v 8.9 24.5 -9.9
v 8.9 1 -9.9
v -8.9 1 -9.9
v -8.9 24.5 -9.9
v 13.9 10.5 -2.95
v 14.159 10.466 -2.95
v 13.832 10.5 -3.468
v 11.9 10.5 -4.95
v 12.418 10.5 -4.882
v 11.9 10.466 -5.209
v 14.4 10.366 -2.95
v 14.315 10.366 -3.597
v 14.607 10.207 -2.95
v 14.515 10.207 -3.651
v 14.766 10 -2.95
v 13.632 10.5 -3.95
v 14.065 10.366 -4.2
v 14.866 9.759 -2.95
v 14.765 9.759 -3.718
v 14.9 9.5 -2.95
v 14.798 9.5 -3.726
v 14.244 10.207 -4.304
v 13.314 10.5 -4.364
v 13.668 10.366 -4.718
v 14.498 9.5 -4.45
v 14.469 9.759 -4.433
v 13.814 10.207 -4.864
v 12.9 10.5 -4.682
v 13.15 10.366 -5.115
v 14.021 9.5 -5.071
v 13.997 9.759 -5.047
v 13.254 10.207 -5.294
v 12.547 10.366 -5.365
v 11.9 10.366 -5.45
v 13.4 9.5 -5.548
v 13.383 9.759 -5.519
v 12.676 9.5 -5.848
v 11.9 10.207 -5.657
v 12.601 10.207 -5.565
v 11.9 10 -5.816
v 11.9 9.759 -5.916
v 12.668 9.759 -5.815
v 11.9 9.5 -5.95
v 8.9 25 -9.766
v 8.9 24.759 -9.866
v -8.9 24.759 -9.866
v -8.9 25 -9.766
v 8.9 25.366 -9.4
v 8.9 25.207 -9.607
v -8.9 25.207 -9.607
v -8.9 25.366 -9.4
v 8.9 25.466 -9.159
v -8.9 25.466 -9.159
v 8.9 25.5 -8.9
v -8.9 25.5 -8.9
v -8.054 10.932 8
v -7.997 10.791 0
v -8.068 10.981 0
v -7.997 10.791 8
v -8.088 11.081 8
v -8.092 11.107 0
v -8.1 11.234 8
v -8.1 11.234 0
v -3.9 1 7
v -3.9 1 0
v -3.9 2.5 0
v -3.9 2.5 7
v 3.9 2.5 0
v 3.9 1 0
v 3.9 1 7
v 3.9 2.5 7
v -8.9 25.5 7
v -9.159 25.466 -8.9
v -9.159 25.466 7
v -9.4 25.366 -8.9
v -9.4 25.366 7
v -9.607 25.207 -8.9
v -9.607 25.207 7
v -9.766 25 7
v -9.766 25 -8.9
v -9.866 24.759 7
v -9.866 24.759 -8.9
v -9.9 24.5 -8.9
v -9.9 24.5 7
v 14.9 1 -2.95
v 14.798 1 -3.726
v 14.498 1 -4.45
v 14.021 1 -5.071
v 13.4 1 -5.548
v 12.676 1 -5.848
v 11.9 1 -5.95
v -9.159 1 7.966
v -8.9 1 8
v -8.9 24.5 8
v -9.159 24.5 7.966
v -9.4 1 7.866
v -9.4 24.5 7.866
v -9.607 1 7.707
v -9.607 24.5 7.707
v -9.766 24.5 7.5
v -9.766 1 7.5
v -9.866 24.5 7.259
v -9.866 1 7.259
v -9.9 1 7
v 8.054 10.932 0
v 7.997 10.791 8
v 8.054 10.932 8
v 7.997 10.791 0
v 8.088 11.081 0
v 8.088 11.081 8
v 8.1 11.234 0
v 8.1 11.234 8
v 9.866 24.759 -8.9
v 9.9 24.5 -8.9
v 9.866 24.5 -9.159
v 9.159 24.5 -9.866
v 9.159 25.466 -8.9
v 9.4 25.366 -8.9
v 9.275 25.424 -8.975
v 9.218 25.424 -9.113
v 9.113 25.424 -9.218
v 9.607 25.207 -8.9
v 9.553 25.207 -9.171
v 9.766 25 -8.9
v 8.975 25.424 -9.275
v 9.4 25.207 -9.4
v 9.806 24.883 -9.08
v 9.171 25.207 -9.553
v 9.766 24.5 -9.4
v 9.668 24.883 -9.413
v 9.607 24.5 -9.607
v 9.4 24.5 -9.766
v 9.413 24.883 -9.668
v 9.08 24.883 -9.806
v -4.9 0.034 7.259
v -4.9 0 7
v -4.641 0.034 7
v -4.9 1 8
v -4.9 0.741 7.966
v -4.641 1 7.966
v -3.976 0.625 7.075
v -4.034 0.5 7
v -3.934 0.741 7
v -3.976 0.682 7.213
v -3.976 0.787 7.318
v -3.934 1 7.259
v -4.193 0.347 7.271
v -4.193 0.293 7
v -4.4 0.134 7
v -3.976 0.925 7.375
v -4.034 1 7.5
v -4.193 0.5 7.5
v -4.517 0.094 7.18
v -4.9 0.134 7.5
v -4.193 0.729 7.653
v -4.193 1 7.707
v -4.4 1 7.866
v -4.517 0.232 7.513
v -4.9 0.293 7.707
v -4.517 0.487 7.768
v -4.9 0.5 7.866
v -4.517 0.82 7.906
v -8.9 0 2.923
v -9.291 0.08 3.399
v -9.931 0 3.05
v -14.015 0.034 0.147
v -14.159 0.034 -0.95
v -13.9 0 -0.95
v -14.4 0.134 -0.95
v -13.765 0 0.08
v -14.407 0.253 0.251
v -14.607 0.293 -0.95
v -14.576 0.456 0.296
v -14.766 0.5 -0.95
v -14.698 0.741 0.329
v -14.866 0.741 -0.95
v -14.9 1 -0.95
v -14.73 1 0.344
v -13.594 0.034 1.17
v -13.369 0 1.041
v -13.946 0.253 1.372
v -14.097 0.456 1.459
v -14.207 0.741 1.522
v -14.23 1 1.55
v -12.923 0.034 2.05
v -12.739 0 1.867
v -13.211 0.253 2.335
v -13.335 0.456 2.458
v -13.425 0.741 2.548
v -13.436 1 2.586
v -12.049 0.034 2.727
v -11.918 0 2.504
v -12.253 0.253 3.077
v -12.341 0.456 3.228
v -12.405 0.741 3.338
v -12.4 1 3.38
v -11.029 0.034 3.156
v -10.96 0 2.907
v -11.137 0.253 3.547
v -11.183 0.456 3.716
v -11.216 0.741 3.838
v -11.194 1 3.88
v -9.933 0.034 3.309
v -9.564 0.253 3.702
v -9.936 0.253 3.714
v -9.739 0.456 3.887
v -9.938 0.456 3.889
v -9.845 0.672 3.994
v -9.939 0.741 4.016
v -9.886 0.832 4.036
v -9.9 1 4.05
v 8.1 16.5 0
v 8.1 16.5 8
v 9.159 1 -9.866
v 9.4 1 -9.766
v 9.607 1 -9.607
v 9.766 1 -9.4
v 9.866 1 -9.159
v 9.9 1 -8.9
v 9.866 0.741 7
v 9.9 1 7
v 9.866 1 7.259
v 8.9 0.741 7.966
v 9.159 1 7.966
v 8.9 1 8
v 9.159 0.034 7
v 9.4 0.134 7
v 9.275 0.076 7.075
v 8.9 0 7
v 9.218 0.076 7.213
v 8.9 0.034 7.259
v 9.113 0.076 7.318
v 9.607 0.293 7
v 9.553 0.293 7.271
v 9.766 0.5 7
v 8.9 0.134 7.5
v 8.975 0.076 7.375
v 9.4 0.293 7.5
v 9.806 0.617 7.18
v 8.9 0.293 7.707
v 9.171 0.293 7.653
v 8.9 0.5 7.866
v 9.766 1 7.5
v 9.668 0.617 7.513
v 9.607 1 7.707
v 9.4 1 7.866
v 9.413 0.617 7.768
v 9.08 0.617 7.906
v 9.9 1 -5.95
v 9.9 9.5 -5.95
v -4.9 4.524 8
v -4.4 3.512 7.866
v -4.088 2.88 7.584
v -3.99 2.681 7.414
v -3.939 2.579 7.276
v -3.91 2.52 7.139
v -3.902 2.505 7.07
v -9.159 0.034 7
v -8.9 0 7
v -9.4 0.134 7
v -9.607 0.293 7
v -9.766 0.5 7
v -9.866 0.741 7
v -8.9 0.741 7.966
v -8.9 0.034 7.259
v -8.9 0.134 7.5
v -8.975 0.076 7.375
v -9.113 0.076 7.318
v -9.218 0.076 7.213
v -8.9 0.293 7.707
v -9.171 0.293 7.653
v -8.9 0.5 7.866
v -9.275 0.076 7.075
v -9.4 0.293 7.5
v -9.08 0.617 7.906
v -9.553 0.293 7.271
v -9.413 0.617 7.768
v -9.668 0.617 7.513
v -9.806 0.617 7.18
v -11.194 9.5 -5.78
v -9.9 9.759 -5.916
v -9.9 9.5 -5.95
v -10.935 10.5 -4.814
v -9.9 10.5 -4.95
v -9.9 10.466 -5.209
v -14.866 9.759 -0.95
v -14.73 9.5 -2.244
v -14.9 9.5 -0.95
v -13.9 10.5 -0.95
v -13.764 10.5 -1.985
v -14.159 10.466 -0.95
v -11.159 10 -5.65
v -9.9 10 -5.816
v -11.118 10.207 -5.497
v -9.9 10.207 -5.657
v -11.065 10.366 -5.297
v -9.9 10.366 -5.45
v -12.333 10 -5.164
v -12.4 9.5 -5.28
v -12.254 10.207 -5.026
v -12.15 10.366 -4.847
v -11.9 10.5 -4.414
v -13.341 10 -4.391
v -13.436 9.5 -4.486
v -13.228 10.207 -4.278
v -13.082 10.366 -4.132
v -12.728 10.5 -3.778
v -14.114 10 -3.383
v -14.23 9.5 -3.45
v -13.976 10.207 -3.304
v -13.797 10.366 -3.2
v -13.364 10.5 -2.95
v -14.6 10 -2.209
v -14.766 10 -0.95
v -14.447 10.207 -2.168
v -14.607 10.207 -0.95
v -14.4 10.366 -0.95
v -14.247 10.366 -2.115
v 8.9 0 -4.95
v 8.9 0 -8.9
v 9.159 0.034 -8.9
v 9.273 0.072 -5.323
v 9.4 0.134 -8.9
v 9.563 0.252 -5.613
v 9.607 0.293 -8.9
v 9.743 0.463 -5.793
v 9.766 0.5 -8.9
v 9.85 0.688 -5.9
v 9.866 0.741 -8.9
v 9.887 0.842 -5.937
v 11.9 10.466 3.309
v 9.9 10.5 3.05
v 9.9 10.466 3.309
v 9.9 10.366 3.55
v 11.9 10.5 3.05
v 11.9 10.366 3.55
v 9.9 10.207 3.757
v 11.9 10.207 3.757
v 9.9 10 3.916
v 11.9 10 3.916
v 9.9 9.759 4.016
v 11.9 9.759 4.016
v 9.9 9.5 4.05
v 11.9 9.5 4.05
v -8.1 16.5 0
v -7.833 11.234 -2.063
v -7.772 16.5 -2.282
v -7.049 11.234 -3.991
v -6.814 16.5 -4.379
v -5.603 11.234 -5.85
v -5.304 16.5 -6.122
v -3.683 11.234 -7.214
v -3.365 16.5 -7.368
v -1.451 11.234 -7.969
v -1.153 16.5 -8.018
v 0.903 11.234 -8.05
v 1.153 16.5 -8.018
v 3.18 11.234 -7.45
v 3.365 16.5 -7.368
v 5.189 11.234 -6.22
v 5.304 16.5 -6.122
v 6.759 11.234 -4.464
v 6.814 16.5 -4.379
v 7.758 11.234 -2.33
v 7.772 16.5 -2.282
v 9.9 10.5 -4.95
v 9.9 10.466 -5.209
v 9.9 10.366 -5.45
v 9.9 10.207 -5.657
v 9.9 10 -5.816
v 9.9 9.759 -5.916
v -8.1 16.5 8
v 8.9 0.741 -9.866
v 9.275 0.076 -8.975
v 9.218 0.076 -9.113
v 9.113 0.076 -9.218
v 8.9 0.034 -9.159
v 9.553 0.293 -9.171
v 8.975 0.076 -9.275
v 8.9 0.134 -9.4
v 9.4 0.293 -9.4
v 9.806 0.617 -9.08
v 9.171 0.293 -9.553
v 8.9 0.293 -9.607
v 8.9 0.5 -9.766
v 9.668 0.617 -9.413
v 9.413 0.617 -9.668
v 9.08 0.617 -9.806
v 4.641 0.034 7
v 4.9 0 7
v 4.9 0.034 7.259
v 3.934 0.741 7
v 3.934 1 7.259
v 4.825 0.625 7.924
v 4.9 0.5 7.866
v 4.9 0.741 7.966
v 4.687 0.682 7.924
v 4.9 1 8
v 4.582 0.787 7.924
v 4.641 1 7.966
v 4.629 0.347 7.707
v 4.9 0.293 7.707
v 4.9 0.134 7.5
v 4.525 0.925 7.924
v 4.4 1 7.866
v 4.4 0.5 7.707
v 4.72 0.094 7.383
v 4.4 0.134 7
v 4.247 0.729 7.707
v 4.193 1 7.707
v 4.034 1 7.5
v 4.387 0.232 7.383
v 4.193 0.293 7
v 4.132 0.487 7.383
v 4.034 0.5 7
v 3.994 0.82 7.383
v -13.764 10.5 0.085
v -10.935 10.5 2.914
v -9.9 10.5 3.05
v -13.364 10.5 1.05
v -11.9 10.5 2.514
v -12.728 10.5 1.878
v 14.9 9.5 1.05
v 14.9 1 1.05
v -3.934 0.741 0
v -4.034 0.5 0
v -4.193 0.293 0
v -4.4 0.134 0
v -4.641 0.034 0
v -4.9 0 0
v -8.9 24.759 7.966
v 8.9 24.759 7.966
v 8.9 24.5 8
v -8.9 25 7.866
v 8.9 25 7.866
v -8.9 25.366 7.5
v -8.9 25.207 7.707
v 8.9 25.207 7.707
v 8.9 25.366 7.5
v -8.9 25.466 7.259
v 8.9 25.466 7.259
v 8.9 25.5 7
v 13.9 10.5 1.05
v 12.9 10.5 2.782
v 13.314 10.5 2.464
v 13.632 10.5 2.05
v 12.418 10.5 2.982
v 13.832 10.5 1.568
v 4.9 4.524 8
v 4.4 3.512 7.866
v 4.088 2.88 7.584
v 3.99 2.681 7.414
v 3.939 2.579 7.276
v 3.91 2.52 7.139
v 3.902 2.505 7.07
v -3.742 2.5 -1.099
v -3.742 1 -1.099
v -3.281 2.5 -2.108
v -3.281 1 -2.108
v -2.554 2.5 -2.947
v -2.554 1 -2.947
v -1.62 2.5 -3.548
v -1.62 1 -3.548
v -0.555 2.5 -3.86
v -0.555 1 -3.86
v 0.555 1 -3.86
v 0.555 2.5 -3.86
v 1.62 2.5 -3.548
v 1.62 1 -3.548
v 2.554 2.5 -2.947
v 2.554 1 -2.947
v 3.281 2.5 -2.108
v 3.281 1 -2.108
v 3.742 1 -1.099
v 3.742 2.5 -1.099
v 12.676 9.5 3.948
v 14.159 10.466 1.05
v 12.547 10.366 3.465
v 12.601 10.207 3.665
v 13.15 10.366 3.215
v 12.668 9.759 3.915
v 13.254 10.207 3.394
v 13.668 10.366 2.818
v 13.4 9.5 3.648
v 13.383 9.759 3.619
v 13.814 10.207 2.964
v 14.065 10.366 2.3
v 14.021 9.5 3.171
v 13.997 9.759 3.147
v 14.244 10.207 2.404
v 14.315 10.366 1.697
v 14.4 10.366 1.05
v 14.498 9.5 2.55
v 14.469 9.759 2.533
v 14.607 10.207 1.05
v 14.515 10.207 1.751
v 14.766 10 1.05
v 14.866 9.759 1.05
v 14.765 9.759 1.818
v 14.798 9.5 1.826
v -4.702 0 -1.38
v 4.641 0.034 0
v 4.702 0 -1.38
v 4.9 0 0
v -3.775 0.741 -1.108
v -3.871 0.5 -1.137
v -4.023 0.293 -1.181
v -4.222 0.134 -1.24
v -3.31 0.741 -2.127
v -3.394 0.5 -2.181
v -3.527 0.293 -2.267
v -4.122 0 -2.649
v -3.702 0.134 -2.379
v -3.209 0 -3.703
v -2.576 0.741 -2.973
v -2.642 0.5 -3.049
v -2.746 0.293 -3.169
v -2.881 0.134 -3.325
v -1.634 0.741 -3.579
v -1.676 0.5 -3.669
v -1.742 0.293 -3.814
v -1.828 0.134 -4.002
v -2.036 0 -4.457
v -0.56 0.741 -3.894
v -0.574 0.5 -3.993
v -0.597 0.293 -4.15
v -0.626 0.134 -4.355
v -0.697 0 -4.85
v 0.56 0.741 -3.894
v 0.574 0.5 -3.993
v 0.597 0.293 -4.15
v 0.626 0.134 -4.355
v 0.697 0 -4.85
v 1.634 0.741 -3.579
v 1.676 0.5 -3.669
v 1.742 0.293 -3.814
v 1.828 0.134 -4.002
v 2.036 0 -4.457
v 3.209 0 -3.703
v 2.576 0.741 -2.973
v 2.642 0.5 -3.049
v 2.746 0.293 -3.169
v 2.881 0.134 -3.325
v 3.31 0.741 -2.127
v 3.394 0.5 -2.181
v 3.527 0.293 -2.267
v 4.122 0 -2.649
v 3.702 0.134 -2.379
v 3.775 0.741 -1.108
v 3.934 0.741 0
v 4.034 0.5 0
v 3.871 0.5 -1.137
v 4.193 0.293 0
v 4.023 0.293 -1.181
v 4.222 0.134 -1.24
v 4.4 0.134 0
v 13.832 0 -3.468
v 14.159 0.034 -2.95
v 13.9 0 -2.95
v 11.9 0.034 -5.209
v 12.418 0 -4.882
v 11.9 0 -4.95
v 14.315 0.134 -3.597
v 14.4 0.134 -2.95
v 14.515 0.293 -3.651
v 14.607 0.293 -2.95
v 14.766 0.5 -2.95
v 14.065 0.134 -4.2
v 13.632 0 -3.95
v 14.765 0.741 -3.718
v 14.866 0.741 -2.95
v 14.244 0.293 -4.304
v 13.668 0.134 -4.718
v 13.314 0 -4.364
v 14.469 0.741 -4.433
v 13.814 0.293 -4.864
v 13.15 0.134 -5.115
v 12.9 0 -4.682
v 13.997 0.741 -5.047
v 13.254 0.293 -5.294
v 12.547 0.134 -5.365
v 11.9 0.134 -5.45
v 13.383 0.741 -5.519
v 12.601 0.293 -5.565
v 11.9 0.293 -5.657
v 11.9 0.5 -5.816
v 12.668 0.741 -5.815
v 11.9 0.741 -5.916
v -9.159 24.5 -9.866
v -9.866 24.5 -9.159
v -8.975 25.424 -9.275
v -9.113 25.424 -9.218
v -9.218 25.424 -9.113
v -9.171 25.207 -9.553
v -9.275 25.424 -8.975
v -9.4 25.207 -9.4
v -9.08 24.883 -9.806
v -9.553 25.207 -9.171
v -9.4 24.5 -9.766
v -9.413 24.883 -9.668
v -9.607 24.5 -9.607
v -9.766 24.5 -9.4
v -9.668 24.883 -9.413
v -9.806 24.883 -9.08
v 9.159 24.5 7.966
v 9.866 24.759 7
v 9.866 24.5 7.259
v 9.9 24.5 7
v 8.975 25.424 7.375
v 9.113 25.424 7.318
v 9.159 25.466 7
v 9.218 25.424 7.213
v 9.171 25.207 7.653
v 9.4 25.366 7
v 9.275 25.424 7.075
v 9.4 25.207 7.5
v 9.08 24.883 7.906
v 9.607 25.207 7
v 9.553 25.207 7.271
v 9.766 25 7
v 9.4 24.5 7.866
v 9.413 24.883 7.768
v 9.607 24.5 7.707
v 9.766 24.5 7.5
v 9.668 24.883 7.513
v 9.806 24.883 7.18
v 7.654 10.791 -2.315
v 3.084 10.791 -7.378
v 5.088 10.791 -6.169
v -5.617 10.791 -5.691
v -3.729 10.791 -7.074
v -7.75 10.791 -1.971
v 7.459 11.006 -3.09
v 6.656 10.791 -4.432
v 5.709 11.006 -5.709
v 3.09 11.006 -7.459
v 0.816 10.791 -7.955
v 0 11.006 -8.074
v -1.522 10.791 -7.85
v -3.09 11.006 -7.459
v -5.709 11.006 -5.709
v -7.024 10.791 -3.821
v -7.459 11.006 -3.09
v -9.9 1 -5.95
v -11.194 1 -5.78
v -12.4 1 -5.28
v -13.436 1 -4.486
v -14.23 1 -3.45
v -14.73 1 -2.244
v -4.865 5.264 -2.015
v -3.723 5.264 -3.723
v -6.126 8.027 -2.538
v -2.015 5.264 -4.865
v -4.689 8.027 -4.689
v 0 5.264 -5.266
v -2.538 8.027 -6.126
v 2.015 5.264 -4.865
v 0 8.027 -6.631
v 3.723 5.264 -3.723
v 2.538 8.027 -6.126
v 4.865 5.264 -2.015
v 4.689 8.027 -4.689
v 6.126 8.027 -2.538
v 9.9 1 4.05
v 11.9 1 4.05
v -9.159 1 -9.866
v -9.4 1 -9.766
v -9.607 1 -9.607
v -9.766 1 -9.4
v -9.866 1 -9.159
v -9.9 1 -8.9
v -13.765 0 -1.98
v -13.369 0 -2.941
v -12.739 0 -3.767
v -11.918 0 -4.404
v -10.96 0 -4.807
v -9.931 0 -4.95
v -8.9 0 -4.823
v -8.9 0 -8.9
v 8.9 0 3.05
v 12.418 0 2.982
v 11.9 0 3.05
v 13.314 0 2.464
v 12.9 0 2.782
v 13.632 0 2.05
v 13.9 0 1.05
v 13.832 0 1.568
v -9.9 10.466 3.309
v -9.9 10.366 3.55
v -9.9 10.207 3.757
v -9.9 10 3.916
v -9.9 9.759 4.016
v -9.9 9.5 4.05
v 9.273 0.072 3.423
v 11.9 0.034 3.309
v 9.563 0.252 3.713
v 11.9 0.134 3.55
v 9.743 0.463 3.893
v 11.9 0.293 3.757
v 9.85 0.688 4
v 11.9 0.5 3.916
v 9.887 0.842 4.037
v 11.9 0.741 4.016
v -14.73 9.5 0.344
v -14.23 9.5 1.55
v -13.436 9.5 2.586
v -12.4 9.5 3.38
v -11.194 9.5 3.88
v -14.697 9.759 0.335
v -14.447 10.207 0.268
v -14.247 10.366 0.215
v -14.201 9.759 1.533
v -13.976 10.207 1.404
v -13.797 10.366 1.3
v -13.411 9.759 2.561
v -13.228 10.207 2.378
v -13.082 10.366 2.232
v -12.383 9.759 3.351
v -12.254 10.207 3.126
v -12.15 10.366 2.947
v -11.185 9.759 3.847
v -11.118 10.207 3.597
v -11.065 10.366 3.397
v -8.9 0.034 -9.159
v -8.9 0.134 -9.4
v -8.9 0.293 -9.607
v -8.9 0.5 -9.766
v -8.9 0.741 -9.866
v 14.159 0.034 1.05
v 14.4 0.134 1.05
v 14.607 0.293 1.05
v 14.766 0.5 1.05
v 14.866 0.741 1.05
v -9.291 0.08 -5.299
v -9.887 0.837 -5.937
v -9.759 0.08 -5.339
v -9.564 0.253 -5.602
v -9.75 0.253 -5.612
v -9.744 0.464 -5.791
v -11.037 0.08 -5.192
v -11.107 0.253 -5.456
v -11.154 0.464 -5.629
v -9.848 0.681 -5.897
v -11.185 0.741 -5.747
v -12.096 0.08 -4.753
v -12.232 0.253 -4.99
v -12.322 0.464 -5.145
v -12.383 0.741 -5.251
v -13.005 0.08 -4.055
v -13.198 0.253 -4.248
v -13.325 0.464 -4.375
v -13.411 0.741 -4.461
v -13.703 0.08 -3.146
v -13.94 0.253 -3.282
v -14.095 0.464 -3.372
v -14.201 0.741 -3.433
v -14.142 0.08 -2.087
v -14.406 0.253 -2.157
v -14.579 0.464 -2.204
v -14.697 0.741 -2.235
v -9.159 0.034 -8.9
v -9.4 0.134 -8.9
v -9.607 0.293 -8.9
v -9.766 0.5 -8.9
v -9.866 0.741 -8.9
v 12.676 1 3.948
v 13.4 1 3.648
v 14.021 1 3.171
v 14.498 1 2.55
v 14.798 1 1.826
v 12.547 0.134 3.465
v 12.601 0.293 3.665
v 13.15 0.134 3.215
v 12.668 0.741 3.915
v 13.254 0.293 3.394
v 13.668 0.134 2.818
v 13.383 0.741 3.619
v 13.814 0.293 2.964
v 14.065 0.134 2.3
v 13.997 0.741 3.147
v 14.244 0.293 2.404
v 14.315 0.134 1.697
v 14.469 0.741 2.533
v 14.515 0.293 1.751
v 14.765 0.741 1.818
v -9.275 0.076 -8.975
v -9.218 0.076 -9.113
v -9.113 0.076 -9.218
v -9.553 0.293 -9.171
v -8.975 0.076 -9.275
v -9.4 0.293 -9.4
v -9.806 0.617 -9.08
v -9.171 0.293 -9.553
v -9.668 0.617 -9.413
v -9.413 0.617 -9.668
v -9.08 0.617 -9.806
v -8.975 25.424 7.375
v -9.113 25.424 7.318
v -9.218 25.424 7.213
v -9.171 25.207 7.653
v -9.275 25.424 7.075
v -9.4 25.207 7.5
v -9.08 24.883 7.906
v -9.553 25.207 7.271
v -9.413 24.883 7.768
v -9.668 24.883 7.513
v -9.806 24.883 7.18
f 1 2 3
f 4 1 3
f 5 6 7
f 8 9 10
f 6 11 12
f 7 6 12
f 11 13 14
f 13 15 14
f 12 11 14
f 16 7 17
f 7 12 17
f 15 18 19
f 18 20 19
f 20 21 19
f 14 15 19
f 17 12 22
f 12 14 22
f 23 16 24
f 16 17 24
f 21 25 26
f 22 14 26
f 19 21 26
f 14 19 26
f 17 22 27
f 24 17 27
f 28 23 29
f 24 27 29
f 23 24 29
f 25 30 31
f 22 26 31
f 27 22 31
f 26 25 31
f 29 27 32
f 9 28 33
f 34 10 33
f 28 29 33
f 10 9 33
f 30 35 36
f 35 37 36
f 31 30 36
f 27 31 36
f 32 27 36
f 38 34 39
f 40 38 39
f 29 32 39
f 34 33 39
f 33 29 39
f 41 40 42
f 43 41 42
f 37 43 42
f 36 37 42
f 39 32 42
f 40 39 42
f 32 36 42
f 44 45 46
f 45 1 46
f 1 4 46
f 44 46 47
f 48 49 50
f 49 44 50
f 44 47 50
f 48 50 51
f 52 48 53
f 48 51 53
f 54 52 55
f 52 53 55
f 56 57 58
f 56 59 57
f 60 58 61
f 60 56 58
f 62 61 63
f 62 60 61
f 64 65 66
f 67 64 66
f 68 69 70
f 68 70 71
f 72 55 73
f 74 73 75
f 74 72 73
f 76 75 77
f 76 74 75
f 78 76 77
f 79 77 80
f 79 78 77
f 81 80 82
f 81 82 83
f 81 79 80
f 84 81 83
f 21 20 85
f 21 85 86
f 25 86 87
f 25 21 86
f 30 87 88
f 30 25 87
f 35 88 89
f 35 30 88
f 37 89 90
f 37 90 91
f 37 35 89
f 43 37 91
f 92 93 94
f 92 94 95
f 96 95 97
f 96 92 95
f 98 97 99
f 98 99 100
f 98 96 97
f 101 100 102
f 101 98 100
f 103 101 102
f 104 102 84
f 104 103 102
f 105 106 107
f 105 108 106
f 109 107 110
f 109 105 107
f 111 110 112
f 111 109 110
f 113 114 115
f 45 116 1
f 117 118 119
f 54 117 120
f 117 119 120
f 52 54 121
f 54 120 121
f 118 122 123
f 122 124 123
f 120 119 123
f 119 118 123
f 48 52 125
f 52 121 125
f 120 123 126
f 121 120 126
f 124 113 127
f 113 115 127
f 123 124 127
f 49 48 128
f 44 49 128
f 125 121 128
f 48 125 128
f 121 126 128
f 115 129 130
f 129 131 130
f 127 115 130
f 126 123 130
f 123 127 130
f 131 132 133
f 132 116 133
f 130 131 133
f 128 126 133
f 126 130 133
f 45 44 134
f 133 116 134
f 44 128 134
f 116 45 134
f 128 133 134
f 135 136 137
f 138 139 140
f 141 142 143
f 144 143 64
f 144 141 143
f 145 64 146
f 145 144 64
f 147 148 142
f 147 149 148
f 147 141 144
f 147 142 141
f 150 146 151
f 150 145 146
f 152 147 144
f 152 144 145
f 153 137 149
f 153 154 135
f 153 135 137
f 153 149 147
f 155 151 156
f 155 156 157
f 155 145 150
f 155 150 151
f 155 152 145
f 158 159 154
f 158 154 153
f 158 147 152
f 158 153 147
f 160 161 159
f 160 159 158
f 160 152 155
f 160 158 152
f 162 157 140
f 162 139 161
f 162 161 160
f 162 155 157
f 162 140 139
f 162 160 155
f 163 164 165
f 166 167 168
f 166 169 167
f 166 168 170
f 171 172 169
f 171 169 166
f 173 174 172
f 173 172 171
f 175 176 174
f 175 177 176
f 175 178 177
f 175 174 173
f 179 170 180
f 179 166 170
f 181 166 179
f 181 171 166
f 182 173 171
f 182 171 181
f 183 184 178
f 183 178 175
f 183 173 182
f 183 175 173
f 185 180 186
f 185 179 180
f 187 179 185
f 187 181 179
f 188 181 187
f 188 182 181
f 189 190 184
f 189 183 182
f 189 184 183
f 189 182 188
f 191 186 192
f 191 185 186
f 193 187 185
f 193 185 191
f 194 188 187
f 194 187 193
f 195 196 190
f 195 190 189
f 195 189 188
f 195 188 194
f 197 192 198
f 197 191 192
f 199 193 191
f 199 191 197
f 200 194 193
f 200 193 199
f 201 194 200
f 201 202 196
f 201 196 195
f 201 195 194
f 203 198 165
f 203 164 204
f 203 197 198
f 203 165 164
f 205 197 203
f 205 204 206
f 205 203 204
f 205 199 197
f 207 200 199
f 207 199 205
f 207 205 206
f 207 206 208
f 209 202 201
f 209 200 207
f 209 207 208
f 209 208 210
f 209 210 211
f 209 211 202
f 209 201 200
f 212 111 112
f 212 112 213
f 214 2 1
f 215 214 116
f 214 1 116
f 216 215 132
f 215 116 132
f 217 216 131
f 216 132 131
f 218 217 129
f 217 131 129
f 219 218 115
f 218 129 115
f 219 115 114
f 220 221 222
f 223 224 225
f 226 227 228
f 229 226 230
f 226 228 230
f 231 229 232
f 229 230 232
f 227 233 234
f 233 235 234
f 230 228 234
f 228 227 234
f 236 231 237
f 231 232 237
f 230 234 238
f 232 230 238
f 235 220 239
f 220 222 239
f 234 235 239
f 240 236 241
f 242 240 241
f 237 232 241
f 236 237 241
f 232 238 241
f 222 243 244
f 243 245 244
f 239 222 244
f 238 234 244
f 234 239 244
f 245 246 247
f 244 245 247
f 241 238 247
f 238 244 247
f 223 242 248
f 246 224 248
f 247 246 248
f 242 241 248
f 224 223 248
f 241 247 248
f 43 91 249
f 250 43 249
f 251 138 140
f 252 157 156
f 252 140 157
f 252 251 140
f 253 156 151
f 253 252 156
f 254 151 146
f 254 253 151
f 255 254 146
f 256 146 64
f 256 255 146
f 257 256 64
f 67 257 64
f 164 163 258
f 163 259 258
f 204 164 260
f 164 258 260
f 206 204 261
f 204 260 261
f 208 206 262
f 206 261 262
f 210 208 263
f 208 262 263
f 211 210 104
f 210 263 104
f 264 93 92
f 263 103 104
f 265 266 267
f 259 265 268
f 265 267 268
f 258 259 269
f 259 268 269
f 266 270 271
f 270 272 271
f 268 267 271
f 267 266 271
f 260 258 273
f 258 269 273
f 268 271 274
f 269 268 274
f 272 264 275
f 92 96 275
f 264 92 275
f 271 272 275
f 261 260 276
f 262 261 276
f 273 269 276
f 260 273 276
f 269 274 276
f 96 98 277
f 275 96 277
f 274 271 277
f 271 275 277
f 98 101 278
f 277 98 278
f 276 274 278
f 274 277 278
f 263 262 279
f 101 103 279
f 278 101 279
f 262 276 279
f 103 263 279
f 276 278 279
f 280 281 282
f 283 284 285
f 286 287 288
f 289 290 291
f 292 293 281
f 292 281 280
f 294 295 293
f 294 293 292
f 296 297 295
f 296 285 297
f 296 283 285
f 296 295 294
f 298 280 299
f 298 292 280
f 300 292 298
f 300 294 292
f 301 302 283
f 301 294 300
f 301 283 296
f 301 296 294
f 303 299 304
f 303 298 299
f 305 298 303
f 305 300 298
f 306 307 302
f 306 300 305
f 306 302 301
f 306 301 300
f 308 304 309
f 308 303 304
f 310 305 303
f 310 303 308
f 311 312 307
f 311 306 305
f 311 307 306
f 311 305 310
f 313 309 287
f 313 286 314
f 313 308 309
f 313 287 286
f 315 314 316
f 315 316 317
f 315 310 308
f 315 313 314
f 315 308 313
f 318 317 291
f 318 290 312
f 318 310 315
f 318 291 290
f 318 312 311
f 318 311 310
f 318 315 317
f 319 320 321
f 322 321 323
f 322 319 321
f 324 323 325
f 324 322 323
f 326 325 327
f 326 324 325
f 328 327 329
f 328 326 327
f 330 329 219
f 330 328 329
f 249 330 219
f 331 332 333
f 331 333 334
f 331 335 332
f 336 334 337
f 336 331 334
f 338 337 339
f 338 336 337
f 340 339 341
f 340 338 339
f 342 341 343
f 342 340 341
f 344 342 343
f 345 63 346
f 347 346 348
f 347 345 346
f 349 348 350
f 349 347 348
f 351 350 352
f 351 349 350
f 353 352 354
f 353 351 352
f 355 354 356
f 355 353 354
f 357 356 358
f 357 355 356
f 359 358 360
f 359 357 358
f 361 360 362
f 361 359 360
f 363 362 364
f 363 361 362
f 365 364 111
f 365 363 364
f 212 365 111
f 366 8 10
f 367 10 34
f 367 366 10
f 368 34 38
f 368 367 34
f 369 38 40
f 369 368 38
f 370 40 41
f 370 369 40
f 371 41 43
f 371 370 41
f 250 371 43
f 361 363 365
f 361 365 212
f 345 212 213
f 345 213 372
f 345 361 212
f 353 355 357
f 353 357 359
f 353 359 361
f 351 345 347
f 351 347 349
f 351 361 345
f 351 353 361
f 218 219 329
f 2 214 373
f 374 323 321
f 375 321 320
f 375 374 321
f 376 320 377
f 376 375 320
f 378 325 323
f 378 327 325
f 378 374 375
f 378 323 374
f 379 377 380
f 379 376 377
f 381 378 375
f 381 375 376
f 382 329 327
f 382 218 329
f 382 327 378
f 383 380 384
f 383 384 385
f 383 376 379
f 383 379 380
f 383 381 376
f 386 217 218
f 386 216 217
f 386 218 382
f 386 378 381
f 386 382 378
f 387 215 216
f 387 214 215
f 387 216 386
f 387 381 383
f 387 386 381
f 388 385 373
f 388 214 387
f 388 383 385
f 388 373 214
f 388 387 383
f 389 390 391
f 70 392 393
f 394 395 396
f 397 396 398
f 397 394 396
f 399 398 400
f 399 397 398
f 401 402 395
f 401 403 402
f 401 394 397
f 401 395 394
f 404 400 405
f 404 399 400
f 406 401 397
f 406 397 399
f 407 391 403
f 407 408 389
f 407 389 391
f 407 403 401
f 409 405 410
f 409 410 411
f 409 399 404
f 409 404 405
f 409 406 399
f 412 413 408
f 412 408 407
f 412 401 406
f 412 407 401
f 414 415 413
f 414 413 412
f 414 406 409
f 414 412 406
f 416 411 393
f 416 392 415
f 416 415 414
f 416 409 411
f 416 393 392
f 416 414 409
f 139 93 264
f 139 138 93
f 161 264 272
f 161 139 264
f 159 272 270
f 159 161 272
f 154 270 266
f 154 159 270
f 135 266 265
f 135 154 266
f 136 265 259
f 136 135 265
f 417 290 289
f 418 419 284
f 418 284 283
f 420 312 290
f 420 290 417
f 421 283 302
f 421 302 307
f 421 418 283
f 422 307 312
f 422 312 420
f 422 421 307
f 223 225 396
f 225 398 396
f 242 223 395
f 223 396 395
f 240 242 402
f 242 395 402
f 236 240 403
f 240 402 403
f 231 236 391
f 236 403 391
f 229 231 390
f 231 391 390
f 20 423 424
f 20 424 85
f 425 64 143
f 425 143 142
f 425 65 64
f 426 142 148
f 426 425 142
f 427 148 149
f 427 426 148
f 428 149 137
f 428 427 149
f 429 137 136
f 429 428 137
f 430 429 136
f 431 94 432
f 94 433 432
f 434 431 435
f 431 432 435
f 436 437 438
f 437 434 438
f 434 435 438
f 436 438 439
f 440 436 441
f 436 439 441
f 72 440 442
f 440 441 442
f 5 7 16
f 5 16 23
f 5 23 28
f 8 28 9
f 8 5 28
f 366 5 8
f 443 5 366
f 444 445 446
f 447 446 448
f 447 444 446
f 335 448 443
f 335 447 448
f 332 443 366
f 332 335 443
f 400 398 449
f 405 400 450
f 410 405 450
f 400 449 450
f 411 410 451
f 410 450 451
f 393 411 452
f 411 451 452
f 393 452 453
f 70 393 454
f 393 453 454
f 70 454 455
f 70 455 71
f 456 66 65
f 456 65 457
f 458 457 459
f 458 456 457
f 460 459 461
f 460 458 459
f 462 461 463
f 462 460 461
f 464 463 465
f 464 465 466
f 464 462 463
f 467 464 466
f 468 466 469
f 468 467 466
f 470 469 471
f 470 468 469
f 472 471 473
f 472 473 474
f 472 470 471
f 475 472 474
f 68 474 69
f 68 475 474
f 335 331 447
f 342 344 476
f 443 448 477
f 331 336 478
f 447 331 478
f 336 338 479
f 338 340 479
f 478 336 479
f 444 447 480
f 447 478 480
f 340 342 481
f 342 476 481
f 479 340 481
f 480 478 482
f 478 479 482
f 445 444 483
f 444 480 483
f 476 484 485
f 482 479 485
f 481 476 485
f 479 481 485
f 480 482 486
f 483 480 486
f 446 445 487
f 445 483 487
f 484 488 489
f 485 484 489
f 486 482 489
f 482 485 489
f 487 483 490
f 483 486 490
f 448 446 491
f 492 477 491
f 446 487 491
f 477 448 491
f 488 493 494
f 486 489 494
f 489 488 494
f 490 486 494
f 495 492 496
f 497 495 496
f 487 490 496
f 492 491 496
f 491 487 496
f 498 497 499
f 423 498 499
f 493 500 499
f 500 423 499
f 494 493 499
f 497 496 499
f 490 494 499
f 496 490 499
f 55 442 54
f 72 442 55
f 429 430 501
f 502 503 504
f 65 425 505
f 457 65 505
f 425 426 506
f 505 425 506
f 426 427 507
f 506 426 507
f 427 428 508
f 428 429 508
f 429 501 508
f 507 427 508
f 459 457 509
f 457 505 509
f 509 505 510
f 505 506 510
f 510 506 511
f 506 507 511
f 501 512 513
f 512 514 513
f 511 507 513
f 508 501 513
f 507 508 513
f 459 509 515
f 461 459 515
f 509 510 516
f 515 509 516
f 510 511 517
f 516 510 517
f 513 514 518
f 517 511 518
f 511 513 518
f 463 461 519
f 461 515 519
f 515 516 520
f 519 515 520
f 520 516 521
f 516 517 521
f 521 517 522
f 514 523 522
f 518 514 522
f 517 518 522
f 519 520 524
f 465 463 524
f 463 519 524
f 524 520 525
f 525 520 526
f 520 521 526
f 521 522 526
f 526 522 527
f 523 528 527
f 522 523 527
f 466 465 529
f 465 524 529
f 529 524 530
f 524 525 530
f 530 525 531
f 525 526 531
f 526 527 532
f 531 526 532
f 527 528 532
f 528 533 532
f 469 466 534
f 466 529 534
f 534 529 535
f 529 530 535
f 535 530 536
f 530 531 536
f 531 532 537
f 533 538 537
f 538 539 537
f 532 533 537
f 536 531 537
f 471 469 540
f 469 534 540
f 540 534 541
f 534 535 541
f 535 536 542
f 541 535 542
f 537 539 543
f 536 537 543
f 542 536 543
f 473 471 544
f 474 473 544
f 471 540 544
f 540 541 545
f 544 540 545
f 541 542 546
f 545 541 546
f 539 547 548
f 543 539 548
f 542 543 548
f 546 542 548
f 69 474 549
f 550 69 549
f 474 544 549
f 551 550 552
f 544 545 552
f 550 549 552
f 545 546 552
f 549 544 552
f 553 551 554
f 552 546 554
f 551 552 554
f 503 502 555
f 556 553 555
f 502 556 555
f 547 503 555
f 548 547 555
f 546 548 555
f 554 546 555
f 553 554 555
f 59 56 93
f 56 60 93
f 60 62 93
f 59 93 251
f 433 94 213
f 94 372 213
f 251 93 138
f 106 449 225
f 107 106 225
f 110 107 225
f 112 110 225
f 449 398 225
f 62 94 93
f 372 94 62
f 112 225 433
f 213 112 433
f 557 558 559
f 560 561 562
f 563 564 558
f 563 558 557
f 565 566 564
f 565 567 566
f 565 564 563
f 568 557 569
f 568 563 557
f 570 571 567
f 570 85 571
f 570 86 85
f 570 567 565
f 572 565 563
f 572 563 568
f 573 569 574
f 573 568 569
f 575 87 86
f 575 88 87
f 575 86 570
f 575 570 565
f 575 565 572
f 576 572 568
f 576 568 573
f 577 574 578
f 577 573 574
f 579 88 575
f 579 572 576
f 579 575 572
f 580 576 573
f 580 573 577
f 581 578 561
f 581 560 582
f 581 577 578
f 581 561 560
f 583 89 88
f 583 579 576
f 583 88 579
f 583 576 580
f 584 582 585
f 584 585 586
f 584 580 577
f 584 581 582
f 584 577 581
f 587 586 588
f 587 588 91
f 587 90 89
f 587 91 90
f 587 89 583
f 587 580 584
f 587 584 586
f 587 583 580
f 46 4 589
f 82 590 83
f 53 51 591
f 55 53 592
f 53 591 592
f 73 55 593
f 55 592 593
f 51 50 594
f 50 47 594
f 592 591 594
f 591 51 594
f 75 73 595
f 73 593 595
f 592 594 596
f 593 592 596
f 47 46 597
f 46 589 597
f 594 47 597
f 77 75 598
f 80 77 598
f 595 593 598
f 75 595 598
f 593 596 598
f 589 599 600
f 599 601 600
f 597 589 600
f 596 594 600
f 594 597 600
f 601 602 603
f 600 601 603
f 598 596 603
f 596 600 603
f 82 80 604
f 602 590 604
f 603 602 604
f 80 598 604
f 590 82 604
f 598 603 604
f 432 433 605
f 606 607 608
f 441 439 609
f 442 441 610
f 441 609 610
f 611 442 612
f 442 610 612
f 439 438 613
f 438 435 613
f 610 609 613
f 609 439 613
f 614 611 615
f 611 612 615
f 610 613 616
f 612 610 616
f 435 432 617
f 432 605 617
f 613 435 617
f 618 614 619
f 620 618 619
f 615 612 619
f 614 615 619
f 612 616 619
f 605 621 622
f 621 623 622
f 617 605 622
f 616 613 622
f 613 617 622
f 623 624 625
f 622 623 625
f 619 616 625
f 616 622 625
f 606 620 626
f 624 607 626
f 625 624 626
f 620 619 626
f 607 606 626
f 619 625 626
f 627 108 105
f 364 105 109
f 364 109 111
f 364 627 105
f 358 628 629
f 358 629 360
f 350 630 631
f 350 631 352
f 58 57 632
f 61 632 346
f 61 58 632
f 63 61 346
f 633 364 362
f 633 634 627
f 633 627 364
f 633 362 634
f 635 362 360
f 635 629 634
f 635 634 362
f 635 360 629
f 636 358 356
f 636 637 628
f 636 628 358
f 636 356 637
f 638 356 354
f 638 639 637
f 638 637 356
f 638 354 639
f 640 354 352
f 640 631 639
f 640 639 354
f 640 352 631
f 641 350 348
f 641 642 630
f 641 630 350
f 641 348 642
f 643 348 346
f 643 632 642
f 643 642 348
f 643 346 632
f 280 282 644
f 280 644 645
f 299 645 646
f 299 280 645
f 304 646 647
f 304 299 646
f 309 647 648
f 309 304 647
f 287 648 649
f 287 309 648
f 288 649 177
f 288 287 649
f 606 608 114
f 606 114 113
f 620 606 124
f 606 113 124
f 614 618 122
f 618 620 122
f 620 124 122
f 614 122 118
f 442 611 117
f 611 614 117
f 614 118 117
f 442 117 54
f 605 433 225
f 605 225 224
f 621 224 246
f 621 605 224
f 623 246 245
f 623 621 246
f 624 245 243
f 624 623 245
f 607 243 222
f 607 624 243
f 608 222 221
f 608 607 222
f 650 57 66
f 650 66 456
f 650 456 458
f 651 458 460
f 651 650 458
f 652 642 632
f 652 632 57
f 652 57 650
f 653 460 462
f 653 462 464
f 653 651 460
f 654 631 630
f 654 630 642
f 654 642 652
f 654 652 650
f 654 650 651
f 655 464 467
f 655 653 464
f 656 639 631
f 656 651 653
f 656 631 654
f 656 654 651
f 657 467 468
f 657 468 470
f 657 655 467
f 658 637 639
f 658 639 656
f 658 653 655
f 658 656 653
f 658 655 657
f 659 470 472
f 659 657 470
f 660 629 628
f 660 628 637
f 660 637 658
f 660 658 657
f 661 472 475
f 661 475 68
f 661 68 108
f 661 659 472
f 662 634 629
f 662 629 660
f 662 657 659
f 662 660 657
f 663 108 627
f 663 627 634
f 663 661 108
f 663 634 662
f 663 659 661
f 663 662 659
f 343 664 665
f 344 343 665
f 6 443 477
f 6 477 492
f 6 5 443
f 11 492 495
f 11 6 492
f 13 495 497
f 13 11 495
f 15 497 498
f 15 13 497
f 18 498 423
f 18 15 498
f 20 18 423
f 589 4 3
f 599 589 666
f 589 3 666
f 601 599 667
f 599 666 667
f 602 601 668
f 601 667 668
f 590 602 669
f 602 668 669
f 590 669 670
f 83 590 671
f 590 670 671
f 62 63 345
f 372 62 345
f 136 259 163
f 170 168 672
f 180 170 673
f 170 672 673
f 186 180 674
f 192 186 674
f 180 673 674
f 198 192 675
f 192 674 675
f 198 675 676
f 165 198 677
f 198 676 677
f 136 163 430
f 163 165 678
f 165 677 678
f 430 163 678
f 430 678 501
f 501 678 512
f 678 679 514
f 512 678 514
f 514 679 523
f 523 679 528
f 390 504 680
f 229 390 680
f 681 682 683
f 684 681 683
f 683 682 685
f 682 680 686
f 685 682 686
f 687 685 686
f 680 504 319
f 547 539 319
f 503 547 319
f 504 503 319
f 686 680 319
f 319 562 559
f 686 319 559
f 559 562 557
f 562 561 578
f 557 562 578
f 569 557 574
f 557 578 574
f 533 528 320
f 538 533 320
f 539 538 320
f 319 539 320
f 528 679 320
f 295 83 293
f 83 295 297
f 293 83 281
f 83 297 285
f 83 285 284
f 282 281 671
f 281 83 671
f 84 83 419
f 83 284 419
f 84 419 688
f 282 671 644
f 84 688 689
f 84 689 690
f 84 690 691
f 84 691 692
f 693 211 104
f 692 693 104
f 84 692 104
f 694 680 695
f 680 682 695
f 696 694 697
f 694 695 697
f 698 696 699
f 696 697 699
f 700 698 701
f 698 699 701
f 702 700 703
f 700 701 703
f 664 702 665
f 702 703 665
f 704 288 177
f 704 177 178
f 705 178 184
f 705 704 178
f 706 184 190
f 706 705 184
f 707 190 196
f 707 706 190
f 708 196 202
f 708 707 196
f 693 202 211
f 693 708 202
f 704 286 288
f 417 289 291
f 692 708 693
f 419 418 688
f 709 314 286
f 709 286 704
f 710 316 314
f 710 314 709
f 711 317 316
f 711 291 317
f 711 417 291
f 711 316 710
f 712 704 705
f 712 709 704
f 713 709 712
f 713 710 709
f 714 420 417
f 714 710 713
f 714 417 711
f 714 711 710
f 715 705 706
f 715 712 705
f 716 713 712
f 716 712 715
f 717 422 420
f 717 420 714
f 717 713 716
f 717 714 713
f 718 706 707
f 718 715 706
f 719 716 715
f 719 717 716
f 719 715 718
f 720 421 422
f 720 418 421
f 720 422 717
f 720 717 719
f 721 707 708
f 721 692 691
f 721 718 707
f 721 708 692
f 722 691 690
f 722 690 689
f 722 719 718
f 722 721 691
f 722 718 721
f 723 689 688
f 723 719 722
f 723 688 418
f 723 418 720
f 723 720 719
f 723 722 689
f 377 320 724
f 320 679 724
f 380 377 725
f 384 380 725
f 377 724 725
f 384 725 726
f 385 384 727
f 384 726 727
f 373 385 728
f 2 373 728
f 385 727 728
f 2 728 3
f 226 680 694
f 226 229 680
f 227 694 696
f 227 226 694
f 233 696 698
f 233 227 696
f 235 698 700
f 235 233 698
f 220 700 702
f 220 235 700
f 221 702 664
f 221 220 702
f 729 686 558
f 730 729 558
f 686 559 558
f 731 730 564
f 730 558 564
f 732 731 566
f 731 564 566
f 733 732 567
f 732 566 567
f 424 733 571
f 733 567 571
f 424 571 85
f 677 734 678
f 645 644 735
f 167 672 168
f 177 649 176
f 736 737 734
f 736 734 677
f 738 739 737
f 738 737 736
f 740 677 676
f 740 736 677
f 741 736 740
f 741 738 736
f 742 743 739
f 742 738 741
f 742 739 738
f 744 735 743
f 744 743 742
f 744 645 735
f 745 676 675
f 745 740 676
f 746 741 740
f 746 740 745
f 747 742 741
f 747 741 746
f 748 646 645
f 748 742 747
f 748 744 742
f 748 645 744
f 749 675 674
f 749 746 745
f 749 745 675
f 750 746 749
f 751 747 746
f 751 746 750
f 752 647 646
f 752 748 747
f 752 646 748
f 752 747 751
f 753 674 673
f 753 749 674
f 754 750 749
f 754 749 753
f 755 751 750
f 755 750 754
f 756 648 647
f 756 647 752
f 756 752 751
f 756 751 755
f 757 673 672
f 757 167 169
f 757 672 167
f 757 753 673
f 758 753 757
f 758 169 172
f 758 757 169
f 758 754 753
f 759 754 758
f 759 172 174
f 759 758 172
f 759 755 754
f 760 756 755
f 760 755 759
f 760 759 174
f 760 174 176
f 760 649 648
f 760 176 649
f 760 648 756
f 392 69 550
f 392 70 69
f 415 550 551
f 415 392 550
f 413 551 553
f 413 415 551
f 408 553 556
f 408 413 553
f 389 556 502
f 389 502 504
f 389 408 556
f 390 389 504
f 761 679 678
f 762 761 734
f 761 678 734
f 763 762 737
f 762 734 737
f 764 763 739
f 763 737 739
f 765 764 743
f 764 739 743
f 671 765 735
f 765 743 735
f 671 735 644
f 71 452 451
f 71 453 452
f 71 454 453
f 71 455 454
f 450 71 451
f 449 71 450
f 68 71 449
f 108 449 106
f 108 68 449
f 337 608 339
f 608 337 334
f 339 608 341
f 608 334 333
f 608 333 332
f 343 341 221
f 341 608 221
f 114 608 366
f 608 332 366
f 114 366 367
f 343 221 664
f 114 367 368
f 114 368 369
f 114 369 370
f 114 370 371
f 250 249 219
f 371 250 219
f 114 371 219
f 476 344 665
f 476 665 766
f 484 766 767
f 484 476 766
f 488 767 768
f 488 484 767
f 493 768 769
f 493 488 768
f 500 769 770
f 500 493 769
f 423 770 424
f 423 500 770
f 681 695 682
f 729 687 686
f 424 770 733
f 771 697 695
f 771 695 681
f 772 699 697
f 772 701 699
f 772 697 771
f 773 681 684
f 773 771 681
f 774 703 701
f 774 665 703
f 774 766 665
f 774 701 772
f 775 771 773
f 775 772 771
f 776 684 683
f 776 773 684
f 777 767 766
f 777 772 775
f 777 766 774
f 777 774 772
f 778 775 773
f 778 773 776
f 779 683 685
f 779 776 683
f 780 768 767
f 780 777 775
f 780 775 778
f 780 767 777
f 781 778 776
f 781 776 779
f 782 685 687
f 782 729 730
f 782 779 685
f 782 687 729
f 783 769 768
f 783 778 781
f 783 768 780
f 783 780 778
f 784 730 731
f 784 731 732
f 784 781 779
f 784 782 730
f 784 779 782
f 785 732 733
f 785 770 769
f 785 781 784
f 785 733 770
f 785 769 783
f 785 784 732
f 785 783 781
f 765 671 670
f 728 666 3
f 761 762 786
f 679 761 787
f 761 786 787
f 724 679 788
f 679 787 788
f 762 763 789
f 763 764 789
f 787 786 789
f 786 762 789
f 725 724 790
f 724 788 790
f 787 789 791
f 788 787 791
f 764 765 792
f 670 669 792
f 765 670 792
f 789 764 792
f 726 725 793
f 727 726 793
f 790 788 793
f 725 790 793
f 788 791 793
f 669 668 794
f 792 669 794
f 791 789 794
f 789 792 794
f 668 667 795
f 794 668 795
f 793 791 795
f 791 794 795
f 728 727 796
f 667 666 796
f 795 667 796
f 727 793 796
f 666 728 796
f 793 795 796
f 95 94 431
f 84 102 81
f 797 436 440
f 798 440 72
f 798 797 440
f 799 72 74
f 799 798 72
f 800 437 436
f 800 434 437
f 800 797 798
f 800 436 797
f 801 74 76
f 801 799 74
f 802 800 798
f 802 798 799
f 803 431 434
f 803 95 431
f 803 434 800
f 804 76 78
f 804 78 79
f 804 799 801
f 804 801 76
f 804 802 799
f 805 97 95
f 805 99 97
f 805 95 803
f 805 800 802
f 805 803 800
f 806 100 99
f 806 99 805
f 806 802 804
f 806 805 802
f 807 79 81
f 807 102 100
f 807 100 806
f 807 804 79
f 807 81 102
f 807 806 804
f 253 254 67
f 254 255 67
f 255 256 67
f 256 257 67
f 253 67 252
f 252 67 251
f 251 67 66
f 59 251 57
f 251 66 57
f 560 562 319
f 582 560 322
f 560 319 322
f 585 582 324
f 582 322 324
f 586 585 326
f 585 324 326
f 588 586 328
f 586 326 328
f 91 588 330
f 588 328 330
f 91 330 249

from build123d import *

# Parameters (mm, degrees)
F1_ANGLE = 180
F3_DEPTH = 18.5
F4_DEPTH = 8
F6_DEPTH = 18.5
F7_DEPTH = 8
F5_W     = 5
F5_H     = 10
F8_DEPTH = 7
F9_R     = 1


with BuildPart() as f1:
    # F0 (on Top) → F1 (revolve)
    with BuildSketch(Plane.XY):
        Polygon((-9.9, 18.5), (-9.9, 0), (-3.9, 0), (-3.9, 2.5), (-8.1, 11), (-8.1, 16.5), (0, 16.5), (0, 18.5), align=None)
    revolve(axis=Axis((0, -5.2679181099, 0), (0, -1, 0)), revolution_arc=F1_ANGLE)

    # F2 (on face) → F3 (join, through all)
    with BuildSketch(Plane(origin=(0, 18.5, 0), x_dir=(-1, 0, 0), z_dir=(0, 1, 0))):
        with BuildLine():
            ThreePointArc((4.3e-08, -9.9), (-7.0003571186, -7.0003571489), (-9.9, 0))
            Line((-9.9, 0), (-9.9, -9.9))
            Line((-9.9, -9.9), (4.3e-08, -9.9))
        make_face()
        with BuildLine():
            ThreePointArc((9.9, 0), (7.0003571489, -7.0003571186), (4.3e-08, -9.9))
            Line((4.3e-08, -9.9), (9.9, -9.9))
            Line((9.9, -9.9), (9.9, 0))
        make_face()
    extrude(amount=-F3_DEPTH)

    # F4 (add): a face of the model
    f4_faces = [f1.faces().sort_by_distance(p)[0] for p in [
        (-9.6290221411, 9.25, 0),
    ]]
    extrude(f4_faces, amount=F4_DEPTH)

    # F5 (on face) → F6 (join, through all)
    with BuildSketch(Plane(origin=(0, 18.5, 0), x_dir=(-1, 0, 0), z_dir=(0, 1, 0))):
        with BuildLine():
            ThreePointArc((9.9, -5.95), (13.4355339059, -4.4855339059), (14.9, -0.95))
            ThreePointArc((14.9, -0.95), (13.4355339059, 2.5855339059), (9.9, 4.05))
            Line((9.9, 4.05), (9.9, -5.95))
        make_face()
        with BuildLine():
            Line((-9.9, -5.95), (-9.9, 4.05))
            Line((-9.9, 4.05), (-11.9, 4.05))
            ThreePointArc((-11.9, 4.05), (-14.0213203436, 3.1713203436), (-14.9, 1.05))
            Line((-14.9, 1.05), (-14.9, -2.95))
            ThreePointArc((-14.9, -2.95), (-14.0213203436, -5.0713203436), (-11.9, -5.95))
            Line((-11.9, -5.95), (-9.9, -5.95))
        make_face()
    extrude(amount=-F6_DEPTH)

    # F5 (on face) → F7 (cut)
    with BuildSketch(Plane(origin=(0, 18.5, 0), x_dir=(-1, 0, 0), z_dir=(0, 1, 0))):
        with BuildLine():
            ThreePointArc((9.9, -5.95), (13.4355339059, -4.4855339059), (14.9, -0.95))
            ThreePointArc((14.9, -0.95), (13.4355339059, 2.5855339059), (9.9, 4.05))
            Line((9.9, 4.05), (9.9, -5.95))
        make_face()
        with BuildLine():
            Line((-9.9, -5.95), (-9.9, 4.05))
            Line((-9.9, 4.05), (-11.9, 4.05))
            ThreePointArc((-11.9, 4.05), (-14.0213203436, 3.1713203436), (-14.9, 1.05))
            Line((-14.9, 1.05), (-14.9, -2.95))
            ThreePointArc((-14.9, -2.95), (-14.0213203436, -5.0713203436), (-11.9, -5.95))
            Line((-11.9, -5.95), (-9.9, -5.95))
        make_face()
    extrude(amount=-F7_DEPTH, mode=Mode.SUBTRACT)

    # F5 (on face) → F8 (join)
    with BuildSketch(Plane(origin=(0, 18.5, 0), x_dir=(-1, 0, 0), z_dir=(0, 1, 0))):
        with BuildLine():
            Line((9.9, -5.95), (9.9, 4.05))
            ThreePointArc((9.9, 4.05), (4.9, -0.95), (9.9, -5.95))
        make_face()
        with BuildLine():
            ThreePointArc((9.9, -5.95), (4.9, -0.95), (9.9, 4.05))
            Line((9.9, 4.05), (9.9, 8))
            Line((9.9, 8), (-9.9, 8))
            Line((-9.9, 8), (-9.9, 4.05))
            Line((-9.9, 4.05), (-4.9, 4.05))
            Line((-4.9, 4.05), (-4.9, -5.95))
            Line((-4.9, -5.95), (-9.9, -5.95))
            Line((-9.9, -5.95), (-9.9, -9.9))
            Line((-9.9, -9.9), (9.9, -9.9))
            Line((9.9, -9.9), (9.9, -5.95))
        make_face()
        with Locations((-7.4, -0.95)):
            Rectangle(F5_W, F5_H)
    extrude(amount=F8_DEPTH)

    # F9
    f9_edges = [f1.edges().sort_by_distance(p)[0] for p in [
        (9.9, 12.75, 8),
        (-9.9, 12.75, 8),
        (9.9, 12.75, -9.9),
        (-9.9, 12.75, -9.9),
        (-6.9, 0, 8),
        (9.9, 0, 6.025),
        (9.9, 0, -7.925),
        (-9.9, 0, -7.925),
        (-9.9, 0, 6.025),
        (0, 0, -9.9),
        (0, 0, -3.9),
        (-3.9, 0, 4),
        (-14.9, 0, -0.95),
        (10.9, 0, -5.95),
        (14.02132, 0, -5.07132),
        (14.9, 0, -0.95),
        (14.02132, 0, 3.17132),
        (10.9, 0, 4.05),
        (6.9, 0, 8),
        (3.9, 0, 4),
        (0, 25.5, 8),
        (9.9, 25.5, -0.95),
        (0, 25.5, -9.9),
        (-9.9, 25.5, -0.95),
        (14.9, 10.5, -0.95),
        (-14.9, 10.5, -0.95),
        (-3.9, 1.25, 8),
        (-8.1, 11, 4),
        (3.9, 1.25, 8),
        (10.9, 10.5, -5.95),
        (14.02132, 10.5, -5.07132),
        (14.02132, 10.5, 3.17132),
        (10.9, 10.5, 4.05),
        (0, 11, -8.1),
        (8.1, 11, 4),
    ]]
    fillet(f9_edges, radius=F9_R)


solid = f1.part
